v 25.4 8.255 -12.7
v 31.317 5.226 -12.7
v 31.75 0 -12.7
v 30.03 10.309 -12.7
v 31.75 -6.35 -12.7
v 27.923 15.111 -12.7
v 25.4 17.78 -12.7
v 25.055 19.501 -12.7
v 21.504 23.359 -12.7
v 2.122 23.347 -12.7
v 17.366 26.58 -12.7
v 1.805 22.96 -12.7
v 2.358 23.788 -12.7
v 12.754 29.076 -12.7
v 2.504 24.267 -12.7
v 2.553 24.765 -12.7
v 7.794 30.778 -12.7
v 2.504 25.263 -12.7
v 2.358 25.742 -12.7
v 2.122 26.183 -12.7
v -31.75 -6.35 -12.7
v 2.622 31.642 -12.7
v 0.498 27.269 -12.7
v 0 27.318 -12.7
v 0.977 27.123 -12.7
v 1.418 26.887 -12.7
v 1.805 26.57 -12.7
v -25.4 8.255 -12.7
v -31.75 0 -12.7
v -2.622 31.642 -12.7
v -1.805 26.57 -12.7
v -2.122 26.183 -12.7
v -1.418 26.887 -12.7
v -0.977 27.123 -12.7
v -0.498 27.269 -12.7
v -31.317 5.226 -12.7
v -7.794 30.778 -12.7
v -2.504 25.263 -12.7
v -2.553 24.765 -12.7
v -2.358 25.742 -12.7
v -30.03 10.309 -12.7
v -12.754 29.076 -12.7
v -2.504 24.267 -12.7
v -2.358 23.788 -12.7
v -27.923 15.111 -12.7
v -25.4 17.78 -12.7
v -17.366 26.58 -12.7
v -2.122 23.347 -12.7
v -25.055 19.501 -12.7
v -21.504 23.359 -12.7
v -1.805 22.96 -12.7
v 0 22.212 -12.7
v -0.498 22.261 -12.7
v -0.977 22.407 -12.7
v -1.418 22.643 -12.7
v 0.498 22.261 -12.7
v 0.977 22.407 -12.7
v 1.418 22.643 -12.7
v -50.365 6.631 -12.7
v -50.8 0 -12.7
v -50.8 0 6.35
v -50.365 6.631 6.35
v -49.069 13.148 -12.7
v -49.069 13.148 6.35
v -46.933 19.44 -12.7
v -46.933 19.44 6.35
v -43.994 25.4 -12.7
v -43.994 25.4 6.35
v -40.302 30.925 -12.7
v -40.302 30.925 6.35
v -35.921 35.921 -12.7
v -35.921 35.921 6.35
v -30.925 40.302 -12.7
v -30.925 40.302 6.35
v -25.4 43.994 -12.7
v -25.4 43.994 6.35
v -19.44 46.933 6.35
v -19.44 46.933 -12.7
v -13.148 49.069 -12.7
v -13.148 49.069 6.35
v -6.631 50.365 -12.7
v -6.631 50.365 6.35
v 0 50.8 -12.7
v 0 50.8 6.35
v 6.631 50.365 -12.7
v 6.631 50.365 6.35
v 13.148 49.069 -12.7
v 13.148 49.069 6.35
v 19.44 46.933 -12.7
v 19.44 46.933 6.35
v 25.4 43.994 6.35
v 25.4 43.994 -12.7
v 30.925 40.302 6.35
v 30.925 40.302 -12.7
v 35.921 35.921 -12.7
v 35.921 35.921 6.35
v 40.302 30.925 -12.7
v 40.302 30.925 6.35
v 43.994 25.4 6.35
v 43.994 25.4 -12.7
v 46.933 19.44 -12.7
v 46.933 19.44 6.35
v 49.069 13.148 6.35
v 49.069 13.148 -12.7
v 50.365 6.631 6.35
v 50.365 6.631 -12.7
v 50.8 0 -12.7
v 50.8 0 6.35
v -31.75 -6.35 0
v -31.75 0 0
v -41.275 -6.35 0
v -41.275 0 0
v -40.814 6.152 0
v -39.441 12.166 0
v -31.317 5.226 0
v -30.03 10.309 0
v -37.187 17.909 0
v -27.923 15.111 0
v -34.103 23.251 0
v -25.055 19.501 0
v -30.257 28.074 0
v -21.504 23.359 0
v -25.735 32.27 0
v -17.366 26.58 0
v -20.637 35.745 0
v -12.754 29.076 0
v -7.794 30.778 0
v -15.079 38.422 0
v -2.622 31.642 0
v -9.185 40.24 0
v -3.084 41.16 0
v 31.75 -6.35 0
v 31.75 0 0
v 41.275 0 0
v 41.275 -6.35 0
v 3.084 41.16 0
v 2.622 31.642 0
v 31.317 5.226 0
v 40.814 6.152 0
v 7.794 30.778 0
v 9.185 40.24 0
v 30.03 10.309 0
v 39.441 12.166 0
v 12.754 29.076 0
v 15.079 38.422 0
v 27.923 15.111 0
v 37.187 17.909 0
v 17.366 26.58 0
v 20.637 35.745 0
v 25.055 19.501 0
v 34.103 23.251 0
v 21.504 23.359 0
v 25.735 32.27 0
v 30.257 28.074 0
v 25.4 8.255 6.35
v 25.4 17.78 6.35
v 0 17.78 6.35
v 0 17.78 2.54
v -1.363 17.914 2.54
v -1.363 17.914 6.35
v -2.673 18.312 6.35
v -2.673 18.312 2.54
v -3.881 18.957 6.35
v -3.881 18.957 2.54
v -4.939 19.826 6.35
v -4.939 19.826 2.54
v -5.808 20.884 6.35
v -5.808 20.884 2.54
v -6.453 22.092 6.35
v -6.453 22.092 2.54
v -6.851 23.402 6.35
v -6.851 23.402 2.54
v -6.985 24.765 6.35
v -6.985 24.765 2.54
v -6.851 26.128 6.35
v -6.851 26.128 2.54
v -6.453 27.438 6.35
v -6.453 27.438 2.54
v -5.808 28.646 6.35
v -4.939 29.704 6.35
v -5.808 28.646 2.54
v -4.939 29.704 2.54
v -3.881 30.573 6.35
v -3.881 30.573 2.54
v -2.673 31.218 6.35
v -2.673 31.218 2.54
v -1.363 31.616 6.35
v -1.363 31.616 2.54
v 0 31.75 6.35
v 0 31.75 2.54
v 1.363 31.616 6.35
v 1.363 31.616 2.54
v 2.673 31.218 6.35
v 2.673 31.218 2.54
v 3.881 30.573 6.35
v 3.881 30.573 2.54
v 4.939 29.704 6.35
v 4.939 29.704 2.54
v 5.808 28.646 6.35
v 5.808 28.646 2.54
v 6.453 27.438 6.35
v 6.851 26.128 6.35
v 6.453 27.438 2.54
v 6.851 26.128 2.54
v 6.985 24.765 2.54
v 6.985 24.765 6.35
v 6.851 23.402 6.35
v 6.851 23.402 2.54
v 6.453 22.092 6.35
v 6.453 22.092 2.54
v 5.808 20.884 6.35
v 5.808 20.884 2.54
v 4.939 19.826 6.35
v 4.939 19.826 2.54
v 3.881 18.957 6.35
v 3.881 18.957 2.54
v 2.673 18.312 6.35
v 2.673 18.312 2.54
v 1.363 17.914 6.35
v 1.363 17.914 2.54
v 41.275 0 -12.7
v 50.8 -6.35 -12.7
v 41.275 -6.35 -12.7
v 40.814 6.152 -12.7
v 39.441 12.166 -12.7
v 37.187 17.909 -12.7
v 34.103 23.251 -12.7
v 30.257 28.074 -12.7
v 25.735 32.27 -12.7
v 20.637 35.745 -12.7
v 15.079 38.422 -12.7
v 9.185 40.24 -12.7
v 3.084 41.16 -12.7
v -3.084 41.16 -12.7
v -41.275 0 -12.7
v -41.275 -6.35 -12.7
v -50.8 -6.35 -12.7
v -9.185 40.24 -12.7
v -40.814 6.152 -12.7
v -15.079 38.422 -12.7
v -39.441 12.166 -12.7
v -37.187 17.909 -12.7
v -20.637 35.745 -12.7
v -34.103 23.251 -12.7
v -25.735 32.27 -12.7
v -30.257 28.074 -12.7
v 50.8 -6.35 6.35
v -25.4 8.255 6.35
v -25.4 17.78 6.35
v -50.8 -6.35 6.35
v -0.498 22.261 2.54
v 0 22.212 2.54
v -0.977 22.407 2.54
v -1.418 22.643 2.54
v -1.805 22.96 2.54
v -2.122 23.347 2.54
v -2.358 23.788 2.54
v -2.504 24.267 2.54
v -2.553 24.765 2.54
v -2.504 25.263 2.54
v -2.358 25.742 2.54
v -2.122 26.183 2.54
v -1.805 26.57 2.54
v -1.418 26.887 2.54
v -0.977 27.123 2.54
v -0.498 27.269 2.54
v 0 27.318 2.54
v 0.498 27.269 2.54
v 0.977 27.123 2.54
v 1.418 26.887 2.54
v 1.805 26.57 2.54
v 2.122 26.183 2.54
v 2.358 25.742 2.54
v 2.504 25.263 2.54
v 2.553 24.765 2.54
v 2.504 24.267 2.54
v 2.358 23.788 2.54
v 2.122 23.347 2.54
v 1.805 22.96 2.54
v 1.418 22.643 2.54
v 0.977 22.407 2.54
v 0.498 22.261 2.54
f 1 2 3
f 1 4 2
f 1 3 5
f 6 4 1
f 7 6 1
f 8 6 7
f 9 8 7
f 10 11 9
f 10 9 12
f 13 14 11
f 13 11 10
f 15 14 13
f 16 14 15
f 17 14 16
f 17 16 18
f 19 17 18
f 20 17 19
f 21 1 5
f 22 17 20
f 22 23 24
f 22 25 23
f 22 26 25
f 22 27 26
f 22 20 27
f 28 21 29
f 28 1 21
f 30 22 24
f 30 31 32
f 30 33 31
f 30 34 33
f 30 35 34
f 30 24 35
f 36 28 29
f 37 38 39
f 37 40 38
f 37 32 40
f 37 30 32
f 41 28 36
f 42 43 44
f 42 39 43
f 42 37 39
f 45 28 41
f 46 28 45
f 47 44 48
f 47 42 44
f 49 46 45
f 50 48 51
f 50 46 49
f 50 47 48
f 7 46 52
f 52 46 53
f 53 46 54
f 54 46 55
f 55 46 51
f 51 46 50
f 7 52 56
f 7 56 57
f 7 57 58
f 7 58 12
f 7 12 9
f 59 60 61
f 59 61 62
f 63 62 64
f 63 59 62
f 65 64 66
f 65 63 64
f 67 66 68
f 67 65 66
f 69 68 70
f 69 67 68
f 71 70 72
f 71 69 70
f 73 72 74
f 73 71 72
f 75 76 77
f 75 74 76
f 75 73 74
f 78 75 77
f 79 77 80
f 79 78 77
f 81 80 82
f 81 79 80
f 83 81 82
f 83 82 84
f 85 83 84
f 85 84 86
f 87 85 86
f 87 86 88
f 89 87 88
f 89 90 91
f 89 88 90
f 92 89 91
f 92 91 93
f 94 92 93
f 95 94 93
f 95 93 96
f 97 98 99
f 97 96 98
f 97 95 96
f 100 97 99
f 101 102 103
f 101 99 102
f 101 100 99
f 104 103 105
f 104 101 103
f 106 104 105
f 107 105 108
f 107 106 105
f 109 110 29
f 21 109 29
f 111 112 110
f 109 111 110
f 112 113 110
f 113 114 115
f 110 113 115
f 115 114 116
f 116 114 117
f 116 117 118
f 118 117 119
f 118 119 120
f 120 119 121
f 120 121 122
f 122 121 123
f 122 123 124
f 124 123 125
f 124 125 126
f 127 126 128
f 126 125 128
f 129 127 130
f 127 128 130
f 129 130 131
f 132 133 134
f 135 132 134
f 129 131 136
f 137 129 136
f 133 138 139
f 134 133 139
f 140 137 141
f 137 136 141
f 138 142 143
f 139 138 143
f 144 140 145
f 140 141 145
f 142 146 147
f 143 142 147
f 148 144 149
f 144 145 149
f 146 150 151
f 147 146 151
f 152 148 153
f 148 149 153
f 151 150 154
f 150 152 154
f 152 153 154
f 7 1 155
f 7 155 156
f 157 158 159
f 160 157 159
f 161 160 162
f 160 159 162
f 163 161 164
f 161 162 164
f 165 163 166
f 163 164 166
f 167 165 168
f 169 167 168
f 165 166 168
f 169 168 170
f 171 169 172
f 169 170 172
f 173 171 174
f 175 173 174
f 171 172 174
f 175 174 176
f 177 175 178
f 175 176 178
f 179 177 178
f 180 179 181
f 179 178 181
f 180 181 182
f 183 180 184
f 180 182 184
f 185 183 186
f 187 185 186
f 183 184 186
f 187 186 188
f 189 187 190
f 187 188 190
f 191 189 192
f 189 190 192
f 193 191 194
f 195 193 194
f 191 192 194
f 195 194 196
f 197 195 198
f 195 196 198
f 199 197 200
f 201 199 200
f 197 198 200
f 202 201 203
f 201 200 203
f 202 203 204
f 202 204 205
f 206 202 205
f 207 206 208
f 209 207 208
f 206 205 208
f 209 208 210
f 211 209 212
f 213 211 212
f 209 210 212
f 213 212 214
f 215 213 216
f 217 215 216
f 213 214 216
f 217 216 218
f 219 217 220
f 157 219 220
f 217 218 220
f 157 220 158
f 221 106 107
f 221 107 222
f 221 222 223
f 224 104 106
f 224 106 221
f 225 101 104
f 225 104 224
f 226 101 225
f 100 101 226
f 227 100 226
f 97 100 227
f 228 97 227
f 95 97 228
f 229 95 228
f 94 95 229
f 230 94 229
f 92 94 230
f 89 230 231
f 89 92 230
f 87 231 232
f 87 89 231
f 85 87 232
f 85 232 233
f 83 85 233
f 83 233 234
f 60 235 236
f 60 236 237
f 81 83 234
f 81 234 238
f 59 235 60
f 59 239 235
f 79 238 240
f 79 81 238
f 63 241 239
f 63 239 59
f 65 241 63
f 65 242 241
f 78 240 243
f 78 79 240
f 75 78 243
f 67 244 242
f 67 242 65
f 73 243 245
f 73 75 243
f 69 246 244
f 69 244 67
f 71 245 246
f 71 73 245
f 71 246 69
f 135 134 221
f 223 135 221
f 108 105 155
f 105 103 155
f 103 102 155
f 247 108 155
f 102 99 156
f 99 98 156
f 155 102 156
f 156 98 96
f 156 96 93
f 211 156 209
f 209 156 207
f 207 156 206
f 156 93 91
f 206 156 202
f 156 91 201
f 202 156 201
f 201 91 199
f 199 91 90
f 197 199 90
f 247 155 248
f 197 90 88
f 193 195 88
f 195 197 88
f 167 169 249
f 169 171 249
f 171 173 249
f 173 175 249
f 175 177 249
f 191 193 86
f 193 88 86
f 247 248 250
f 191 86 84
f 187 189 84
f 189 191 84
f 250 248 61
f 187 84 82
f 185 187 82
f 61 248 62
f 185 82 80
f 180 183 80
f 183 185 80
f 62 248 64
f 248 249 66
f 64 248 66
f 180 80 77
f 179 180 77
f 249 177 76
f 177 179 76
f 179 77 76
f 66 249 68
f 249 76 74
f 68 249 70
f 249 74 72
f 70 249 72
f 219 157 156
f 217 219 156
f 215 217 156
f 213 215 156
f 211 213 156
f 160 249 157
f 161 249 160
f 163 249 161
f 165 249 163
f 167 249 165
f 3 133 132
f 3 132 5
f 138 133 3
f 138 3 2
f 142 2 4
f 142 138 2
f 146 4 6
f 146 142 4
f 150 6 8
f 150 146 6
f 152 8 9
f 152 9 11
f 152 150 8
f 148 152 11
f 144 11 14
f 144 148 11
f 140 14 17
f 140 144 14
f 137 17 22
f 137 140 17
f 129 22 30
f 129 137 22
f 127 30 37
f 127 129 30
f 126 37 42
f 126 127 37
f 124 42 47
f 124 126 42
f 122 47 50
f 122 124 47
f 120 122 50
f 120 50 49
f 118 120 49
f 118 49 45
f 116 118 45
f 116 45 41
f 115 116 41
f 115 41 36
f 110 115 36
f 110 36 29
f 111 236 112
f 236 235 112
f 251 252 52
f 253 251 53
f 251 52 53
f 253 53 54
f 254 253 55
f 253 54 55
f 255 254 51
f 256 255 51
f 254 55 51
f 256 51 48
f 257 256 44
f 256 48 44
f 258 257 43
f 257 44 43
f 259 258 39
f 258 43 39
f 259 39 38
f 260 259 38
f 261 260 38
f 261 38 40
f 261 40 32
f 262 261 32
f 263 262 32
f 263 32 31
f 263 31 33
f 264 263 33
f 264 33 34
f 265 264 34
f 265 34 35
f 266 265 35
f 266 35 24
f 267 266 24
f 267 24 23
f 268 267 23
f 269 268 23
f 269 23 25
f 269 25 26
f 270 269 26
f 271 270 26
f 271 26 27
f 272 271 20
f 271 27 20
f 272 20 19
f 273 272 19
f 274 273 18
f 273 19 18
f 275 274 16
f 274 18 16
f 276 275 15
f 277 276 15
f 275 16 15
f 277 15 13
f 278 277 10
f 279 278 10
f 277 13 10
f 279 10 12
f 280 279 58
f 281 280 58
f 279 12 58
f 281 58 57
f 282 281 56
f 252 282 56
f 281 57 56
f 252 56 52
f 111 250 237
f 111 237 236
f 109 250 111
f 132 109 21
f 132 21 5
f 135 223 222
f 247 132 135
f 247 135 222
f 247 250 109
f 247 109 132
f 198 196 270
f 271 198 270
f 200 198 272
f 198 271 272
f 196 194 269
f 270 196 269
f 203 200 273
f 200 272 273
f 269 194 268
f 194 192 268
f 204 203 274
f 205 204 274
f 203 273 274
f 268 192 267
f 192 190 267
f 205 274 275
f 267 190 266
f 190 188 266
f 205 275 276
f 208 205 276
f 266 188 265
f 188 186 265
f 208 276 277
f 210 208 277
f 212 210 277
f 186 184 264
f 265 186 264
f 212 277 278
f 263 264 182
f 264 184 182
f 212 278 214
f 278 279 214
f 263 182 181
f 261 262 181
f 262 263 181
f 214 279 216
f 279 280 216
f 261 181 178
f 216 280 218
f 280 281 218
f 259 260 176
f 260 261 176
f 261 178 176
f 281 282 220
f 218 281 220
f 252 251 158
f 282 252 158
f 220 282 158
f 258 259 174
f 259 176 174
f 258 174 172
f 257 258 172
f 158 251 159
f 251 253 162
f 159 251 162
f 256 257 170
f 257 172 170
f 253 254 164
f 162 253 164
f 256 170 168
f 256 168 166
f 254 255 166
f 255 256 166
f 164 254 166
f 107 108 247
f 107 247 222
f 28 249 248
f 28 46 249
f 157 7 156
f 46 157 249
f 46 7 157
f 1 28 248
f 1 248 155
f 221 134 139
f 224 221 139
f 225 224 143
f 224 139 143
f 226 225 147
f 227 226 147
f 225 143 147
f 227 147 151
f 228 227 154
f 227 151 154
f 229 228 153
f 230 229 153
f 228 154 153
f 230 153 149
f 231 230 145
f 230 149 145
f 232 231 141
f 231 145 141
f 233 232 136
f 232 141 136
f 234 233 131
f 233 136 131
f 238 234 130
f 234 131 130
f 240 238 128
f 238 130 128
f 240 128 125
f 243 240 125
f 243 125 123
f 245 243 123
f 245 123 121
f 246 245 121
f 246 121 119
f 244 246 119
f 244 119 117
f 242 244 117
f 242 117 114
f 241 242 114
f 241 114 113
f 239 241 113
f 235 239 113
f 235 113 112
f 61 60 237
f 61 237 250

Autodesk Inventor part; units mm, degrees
ref_plane "YZ Plane" through (0, 0, 0) normal (1, 0, 0) x (0, 1, 0)
ref_plane "XZ Plane" through (0, 0, 0) normal (0, 1, 0) x (-1, 0, 0)
ref_plane "XY Plane" through (0, 0, 0) normal (0, 0, 1) x (1, 0, 0)
sketch "Sketch2" plane through (0, 0, 0) normal (0, 0, 1) x (1, 0, 0)
  arc A0 (31.75, 0) -> (-31.75, 0) centre (0, 0) ccw
  arc A1 (41.275, 0) -> (-41.275, 0) centre (0, 0) ccw
  line L0 (-41.275, 0) -> (-31.75, 0)
  line L1 (31.75, 0) -> (41.275, 0)
  arc A2 (50.8, 0) -> (-50.8, 0) centre (0, 0) ccw
  line L2 (-50.8, 0) -> (-41.275, 0)
  line L3 (41.275, 0) -> (50.8, 0)
  line L4 (-31.75, 0) -> (31.75, 0)
  line L5 (0, 0) -> (0, 31.75) construction
  line L6 (0, 8.255) -> (25.4, 8.255)
  line L7 (25.4, 8.255) -> (25.4, 17.78)
  line L8 (25.4, 17.78) -> (0, 17.78)
  line L9 (0, 17.78) -> (-25.4, 17.78)
  line L10 (-25.4, 17.78) -> (-25.4, 8.255)
  line L11 (-25.4, 8.255) -> (0, 8.255)
  dimension "d2" = 63.5
  dimension "d3" = 9.525
  dimension "d4" = 9.525
  dimension "d5" = 25.4
  dimension "d6" = 8.255
  dimension "d7" = 9.525
extrude "Extrusion1" add sketch "Sketch2" along normal blind 6.35
extrude "Extrusion2" add sketch "Sketch2" against normal blind 12.7 contours L4 A0 | A1 L2 A2 L3
sketch "Sketch5" plane through (0, 0, 6.35) normal (0, 0, 1) x (1, 0, 0)
  line L0 (-25.4, 17.78) -> (25.4, 17.78) projected
  arc A0 (31.75, 0) -> (-31.75, 0) centre (0, 0) ccw projected
  line L1 (0, 17.78) -> (0, 31.75) construction
  arc A1 (31.75, 0) -> (-31.75, 0) centre (0, 0) ccw construction
  point P0 (0, 24.765)
hole "Hole2" at (0, 24.765, 6.35) direction (0, 0, -1) diameter 5.1054 end through all counterbore diameter 13.97 counterbore depth 3.81 clearance for "Socket Head Cap Screw" size "#10" standard "Ansi Unified Screw Threads"
sketch "Sketch6" plane through (-50.8, 0, 6.35) normal (0, -1, 0) x (1, 0, 0)
  line L0 (101.6, 0) -> (101.6, -19.05) projected
  line L1 (0, -19.05) -> (0, 0) projected
  line L2 (101.6, 0) -> (0, 0)
  line L3 (0, 0) -> (0, -19.05)
  line L4 (9.525, -19.05) -> (0, -19.05) projected
  line L5 (0, -19.05) -> (9.525, -19.05)
  line L6 (9.525, -6.35) -> (19.05, -6.35) projected
  line L7 (9.525, -19.05) -> (9.525, -6.35)
  line L8 (19.05, -6.35) -> (19.05, -19.05) projected
  line L9 (9.525, -6.35) -> (19.05, -6.35)
  line L10 (19.05, -6.35) -> (19.05, -19.05)
  line L11 (19.05, -19.05) -> (82.1864, -19.05)
  line L12 (92.075, -19.05) -> (9.525, -19.05) projected
  line L13 (82.55, -6.35) -> (82.55, -19.05) projected
  line L14 (82.55, -6.35) -> (92.075, -6.35)
  line L15 (92.075, -6.35) -> (92.075, -19.05) projected
  line L16 (92.075, -6.35) -> (92.075, -19.05)
  line L17 (101.6, -19.05) -> (92.075, -19.05) projected
  line L18 (92.075, -19.05) -> (101.6, -19.05)
  line L19 (101.6, -19.05) -> (101.6, 0)
  point P0 (50.8, -6.35)
extrude "Extrusion3" add sketch "Sketch6" along normal blind 6.35 contours L0 L17 L15 L14 L13 L12 L11 L8 L6 L7 L4 L1 L2
equation "\"d2\" = insideDiameterOfRing"
equation "\"d3\" = innerRingWidth"
equation "\"d4\" = outerRingWidth"
equation "\"d5\" = halfWidthForPryBar"
equation "\"d6\" = distanceFromEdgeToPryBar"
equation "\"d7\" = depthForPryBar"
equation "\"d8\" = topPartHeight"
equation "\"d10\" = lowerPartHeight"
equation "\"insideDiameterOfRing\" = 63.5"
equation "\"wallThicknessOfRing\" = 9.525"
equation "\"outsideDiameterOfRing\" = insideDiameterOfRing + 2 * wallThicknessOfRing"
equation "\"widthForPryBar\" = 50.8"
equation "\"outerRingWidth\" = 9.525"
equation "\"innerRingWidth\" = 9.525"
equation "\"halfWidthForPryBar\" = 0.5 * widthForPryBar"
equation "\"distanceFromEdgeToPryBar\" = 8.255"
equation "\"totalHeightOfPart\" = 19.05"
equation "\"topPartHeight\" = 6.35"
equation "\"lowerPartHeight\" = totalHeightOfPart - topPartHeight"
equation "\"depthForPryBar\" = 9.525"
properties part number "dRingHolder" material "PBT Plastic"
